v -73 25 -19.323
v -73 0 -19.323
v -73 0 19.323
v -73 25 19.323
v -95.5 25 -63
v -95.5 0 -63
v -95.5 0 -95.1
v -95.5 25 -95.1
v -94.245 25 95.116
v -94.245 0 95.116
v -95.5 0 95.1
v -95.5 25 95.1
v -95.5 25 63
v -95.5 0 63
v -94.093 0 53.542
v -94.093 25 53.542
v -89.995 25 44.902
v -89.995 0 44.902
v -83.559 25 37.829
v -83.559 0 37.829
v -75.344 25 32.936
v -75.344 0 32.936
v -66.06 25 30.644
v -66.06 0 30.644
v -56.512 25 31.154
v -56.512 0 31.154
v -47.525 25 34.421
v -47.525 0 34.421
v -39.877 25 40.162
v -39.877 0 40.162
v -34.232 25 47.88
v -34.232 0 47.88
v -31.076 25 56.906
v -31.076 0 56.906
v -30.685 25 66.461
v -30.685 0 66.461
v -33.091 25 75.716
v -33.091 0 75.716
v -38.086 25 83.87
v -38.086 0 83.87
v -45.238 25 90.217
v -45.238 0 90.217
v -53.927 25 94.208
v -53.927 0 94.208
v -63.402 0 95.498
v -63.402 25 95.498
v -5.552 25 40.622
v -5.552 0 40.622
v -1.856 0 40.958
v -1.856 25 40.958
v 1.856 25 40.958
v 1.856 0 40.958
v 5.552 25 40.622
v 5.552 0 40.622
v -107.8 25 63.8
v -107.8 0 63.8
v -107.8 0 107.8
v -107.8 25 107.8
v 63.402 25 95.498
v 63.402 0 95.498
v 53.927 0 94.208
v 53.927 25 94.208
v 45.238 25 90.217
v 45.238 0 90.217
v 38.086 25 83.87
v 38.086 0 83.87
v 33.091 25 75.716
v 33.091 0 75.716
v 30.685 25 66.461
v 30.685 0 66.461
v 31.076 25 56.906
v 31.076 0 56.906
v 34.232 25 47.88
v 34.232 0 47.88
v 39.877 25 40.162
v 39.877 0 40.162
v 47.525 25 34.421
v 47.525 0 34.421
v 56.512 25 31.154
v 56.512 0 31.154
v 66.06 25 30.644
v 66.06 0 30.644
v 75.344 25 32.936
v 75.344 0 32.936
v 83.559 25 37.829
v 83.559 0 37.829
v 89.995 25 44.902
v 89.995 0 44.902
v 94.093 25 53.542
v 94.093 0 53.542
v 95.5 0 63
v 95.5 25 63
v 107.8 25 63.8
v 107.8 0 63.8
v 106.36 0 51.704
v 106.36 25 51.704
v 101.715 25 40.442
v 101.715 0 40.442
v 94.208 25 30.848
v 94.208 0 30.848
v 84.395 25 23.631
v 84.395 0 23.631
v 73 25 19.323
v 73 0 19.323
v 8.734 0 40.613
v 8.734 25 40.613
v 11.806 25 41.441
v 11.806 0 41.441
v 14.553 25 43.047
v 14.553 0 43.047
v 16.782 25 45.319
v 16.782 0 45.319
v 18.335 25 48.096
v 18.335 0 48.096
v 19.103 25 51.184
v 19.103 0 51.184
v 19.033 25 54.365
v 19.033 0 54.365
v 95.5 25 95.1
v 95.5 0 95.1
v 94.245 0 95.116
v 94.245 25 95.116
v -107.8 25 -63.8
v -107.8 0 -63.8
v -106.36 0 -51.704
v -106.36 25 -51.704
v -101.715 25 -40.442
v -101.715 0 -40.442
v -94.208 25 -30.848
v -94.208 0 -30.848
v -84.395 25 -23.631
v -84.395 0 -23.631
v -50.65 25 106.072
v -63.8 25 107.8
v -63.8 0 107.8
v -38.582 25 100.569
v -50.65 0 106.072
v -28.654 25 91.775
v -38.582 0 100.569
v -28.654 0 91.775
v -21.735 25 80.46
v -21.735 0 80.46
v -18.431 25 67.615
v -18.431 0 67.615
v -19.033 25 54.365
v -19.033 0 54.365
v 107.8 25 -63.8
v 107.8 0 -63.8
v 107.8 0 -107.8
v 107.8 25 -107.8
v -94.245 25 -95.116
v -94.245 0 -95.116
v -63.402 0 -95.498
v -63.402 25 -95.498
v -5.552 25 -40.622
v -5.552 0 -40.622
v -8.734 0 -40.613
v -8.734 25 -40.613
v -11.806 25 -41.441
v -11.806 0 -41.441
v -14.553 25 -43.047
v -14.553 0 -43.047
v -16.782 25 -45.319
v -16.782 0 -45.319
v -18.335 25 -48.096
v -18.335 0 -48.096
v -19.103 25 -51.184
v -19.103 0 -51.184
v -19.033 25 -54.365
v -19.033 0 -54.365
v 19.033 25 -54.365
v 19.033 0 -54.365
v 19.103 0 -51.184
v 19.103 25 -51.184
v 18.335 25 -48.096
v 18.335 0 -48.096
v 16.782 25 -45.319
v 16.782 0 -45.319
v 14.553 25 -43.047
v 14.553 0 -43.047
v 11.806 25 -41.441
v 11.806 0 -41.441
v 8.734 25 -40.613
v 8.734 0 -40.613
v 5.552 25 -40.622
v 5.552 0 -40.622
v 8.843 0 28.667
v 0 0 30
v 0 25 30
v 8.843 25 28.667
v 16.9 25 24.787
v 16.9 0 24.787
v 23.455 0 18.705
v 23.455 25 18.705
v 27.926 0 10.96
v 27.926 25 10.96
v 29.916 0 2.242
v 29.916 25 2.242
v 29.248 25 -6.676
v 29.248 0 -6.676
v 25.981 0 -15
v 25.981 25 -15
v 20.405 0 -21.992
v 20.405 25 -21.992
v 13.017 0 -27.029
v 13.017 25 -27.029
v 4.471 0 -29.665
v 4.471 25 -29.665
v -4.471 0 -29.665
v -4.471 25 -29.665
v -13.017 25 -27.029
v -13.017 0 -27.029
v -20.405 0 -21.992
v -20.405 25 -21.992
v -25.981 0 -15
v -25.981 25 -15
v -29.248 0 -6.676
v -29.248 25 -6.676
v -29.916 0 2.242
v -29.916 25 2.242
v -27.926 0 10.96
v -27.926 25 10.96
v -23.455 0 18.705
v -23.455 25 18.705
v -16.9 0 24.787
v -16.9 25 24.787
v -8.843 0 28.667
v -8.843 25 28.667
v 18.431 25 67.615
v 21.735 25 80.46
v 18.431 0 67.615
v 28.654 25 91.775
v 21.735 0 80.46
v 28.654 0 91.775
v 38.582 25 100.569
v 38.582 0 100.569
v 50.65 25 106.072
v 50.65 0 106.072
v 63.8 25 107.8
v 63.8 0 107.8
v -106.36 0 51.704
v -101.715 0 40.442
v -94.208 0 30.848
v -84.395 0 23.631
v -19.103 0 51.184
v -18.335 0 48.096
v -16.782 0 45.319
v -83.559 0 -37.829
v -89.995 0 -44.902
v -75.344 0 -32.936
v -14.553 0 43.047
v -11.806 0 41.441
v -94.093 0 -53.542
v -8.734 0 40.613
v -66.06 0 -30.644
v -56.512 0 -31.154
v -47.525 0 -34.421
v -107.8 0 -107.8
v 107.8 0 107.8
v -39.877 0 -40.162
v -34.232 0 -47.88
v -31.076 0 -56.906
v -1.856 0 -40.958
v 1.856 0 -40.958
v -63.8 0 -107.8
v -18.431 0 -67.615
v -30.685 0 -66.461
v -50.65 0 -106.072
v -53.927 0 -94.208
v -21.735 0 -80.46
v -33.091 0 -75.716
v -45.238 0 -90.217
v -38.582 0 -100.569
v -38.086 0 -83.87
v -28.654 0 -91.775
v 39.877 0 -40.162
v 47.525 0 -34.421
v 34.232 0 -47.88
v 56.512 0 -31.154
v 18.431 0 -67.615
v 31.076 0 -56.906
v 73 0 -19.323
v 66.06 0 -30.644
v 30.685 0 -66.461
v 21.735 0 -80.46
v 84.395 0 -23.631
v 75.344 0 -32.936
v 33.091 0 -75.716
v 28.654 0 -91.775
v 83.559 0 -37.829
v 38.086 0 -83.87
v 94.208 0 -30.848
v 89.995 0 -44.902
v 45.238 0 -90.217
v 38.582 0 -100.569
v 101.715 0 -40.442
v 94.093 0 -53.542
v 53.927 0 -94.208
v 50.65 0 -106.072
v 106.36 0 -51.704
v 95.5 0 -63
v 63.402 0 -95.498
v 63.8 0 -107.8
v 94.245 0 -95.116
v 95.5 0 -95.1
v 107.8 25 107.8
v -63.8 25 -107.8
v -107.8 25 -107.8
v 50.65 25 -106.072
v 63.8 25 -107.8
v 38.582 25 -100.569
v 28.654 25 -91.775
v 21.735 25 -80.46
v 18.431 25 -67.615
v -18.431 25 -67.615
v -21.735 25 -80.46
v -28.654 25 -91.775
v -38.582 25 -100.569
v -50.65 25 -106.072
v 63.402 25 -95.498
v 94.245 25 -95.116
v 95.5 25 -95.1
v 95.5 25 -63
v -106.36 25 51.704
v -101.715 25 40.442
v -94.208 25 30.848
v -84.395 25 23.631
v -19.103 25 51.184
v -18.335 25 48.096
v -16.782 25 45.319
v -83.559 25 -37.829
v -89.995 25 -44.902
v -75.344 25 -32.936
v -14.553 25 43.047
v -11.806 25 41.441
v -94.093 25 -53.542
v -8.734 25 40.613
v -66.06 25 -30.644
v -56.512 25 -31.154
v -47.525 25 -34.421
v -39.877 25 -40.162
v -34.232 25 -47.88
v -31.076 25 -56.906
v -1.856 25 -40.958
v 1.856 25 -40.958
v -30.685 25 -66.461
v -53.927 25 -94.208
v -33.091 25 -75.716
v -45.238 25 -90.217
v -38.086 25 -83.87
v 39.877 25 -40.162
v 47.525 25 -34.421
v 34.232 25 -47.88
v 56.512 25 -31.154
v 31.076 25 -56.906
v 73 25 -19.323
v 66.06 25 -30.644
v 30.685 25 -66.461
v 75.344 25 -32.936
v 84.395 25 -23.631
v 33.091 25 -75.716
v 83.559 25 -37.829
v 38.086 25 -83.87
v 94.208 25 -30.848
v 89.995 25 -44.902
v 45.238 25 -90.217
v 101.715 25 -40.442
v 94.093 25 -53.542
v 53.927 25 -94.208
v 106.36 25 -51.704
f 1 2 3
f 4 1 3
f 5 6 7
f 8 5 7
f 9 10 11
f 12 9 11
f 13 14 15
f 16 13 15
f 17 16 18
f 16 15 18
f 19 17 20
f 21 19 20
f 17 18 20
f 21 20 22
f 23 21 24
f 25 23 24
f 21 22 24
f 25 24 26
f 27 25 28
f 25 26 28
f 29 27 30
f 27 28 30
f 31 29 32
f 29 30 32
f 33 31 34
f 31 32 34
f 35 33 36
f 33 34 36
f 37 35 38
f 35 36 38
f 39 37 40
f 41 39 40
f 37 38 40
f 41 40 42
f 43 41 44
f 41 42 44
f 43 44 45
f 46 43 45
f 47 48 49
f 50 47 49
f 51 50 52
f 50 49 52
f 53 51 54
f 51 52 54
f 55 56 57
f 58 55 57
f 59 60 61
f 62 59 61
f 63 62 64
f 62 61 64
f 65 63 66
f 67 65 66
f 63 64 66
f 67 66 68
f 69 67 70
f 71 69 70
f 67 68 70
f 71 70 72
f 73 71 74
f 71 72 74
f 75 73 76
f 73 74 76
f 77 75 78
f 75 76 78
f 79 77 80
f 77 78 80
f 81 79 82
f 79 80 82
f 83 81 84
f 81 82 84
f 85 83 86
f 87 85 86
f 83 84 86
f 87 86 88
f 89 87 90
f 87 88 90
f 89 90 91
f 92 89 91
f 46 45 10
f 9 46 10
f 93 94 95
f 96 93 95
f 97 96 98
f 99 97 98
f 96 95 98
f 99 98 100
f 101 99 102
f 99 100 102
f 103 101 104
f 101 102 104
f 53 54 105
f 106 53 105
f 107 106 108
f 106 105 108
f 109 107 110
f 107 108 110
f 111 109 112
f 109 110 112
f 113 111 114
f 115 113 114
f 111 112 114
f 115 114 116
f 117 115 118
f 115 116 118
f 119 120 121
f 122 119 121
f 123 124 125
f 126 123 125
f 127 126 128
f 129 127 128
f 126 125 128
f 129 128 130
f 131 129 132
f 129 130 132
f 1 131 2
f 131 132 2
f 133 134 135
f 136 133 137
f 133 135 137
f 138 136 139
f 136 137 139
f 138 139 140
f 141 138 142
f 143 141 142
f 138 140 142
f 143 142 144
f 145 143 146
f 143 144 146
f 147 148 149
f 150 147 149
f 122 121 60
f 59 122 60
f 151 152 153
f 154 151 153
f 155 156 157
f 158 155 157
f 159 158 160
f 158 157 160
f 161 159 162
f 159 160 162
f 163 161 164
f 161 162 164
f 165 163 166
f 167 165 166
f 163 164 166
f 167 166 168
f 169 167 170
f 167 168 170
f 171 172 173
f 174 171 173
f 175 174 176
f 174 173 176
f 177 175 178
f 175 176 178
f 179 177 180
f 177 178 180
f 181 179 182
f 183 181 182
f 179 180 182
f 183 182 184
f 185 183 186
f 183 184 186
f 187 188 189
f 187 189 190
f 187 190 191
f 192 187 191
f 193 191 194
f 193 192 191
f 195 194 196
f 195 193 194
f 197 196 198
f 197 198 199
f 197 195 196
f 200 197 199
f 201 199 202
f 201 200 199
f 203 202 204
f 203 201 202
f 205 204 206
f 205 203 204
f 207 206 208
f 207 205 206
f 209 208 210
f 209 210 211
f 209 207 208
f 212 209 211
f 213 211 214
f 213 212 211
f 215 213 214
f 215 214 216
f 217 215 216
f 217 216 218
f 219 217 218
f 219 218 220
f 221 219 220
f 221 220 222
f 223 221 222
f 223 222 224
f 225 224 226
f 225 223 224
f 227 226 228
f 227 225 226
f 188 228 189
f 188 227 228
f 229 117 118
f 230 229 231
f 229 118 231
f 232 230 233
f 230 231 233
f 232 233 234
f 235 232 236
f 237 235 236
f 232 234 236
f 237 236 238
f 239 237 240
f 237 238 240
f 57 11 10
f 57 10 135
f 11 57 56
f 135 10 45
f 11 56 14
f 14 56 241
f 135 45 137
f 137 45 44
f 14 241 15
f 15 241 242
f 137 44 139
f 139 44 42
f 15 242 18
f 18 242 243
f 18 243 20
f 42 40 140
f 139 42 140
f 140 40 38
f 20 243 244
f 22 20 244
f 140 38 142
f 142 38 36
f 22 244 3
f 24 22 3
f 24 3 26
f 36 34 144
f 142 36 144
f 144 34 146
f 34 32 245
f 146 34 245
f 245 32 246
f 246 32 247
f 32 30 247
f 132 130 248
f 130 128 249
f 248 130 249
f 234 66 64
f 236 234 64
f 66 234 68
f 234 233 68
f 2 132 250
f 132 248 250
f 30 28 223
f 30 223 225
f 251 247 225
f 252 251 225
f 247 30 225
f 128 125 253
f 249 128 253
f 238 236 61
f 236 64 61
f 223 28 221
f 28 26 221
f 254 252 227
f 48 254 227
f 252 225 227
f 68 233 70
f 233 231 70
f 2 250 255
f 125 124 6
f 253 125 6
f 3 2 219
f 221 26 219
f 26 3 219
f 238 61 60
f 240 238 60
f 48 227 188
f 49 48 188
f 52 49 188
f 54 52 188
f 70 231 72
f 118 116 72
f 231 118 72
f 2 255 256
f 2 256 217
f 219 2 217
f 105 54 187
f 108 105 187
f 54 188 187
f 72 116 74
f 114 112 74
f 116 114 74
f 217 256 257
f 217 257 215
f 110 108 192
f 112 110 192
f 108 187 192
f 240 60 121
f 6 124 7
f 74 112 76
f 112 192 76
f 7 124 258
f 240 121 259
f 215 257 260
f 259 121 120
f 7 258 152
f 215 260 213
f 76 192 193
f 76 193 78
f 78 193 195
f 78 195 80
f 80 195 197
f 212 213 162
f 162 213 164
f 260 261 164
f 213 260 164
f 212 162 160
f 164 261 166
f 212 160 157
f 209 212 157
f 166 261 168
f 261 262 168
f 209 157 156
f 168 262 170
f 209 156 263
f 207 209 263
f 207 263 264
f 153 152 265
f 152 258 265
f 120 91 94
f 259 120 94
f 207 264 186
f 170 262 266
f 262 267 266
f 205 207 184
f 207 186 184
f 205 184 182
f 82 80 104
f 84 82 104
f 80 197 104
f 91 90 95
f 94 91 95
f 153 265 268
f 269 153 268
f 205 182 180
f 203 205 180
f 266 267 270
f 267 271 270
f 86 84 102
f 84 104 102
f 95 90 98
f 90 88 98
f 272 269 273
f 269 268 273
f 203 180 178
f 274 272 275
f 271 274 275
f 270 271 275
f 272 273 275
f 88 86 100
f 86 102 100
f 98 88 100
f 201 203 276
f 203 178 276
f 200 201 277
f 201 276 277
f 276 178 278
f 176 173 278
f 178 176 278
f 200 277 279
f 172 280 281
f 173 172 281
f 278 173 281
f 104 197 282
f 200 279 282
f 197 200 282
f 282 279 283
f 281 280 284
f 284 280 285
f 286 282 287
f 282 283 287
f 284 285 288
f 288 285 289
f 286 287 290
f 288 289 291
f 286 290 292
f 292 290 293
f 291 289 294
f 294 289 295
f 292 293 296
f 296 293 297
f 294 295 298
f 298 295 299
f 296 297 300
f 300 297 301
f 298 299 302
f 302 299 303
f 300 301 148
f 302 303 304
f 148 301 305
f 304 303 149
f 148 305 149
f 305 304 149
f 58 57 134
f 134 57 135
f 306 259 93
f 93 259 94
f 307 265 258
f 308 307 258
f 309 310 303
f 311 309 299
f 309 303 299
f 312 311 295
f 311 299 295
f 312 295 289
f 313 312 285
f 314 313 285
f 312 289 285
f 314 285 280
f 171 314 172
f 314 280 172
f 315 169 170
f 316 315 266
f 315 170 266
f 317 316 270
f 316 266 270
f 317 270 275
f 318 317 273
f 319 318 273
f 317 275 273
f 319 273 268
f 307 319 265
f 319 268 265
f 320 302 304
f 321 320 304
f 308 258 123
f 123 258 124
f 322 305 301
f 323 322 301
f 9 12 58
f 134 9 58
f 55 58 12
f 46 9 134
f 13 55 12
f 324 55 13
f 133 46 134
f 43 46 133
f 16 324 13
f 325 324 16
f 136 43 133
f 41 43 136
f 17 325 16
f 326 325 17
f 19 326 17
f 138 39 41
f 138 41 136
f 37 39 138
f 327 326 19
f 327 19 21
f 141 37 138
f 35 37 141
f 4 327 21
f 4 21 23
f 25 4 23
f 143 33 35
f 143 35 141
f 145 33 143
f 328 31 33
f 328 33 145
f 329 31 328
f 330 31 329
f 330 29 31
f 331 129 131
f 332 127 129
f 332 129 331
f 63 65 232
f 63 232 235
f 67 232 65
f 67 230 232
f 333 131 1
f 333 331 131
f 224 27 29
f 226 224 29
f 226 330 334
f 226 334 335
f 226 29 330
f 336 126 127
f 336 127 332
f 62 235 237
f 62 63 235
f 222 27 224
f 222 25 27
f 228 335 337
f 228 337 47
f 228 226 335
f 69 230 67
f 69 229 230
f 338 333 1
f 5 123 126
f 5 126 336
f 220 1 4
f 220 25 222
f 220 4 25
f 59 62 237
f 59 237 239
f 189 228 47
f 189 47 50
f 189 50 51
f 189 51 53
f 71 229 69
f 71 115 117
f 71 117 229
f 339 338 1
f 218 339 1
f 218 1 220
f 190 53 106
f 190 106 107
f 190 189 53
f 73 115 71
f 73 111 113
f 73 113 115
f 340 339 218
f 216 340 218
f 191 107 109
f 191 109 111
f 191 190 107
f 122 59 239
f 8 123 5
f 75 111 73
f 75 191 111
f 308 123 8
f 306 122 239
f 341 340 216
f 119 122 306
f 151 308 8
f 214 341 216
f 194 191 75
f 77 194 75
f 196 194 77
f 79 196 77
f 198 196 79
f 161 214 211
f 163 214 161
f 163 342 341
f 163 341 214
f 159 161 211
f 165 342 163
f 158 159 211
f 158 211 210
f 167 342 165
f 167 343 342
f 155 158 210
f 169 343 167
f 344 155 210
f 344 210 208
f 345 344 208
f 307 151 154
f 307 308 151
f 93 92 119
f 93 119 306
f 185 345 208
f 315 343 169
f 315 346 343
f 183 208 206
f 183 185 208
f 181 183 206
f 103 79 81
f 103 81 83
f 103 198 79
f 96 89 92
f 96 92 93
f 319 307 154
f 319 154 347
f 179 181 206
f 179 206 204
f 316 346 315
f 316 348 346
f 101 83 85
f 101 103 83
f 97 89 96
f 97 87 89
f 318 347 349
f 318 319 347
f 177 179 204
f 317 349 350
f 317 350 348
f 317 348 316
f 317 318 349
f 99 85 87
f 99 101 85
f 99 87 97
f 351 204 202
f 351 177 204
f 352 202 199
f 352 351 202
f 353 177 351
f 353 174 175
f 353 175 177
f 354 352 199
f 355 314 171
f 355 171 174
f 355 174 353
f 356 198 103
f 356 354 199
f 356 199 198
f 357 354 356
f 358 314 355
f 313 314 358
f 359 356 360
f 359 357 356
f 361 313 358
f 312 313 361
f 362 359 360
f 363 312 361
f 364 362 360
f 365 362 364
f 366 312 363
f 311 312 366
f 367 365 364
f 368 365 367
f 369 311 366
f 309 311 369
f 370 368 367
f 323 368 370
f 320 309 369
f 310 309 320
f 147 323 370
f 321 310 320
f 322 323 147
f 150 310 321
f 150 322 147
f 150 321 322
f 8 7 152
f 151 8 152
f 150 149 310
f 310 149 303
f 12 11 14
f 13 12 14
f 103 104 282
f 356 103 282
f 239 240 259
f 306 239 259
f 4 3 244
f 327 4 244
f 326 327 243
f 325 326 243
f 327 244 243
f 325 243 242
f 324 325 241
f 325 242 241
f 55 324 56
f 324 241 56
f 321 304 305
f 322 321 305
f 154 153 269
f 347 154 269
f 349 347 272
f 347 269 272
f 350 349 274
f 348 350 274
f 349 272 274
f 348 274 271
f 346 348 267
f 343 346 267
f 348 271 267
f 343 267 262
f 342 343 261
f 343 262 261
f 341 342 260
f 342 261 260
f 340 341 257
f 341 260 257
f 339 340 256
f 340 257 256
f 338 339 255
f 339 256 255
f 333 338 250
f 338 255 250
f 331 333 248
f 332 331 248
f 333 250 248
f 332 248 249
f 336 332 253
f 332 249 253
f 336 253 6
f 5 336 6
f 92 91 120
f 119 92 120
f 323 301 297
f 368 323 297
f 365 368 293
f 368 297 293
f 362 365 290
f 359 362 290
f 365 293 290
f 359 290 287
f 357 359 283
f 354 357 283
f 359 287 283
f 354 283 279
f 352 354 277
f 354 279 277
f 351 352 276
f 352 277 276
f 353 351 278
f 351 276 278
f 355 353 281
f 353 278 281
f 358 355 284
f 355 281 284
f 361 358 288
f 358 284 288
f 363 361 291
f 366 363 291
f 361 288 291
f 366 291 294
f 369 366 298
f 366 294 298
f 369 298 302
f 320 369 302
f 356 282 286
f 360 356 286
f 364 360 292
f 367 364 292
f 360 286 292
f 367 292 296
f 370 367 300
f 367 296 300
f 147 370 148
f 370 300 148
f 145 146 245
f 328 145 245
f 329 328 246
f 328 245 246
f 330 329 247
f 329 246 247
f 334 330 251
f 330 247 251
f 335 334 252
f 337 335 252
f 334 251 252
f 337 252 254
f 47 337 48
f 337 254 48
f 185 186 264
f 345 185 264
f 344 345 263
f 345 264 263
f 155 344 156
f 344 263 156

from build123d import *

# Parameters (mm, degrees)
SKETCH1_R           = 30
BOSS_EXTRUDE1_DEPTH = 25


with BuildPart() as part:
    # Sketch1 → Boss-Extrude1 (new body)
    with BuildSketch(Plane(origin=(0, 0, 0), x_dir=(1, 0, 0), z_dir=(0, 1, 0))):
        with BuildLine():
            Line((-63.8, 107.8), (-107.8, 107.8))
            Line((-107.8, 107.8), (-107.8, 63.8))
            ThreePointArc((-107.8, 63.8), (-98.288961426, 35.388965946), (-73, 19.323003766))
            Line((-73, 19.323003766), (-73, -19.323003766))
            ThreePointArc((-73, -19.323003766), (-98.288961426, -35.388965946), (-107.8, -63.8))
            Line((-107.8, -63.8), (-107.8, -107.8))
            Line((-107.8, -107.8), (-63.8, -107.8))
            ThreePointArc((-63.8, -107.8), (-28.653661458, -91.775146025), (-19.03272249, -54.365273115))
            ThreePointArc((-19.03272249, -54.365273115), (-15.743256927, -44.108614607), (-5.551800988, -40.62237691))
            ThreePointArc((-5.551800988, -40.62237691), (0, -41), (5.551800988, -40.62237691))
            ThreePointArc((5.551800988, -40.62237691), (15.743256927, -44.108614607), (19.03272249, -54.365273115))
            ThreePointArc((19.03272249, -54.365273115), (28.653661458, -91.775146025), (63.8, -107.8))
            Line((63.8, -107.8), (107.8, -107.8))
            Line((107.8, -107.8), (107.8, -63.8))
            ThreePointArc((107.8, -63.8), (98.288961426, -35.388965946), (73, -19.323003766))
            Line((73, -19.323003766), (73, 19.323003766))
            ThreePointArc((73, 19.323003766), (98.288961426, 35.388965946), (107.8, 63.8))
            Line((107.8, 63.8), (107.8, 107.8))
            Line((107.8, 107.8), (63.8, 107.8))
            ThreePointArc((63.8, 107.8), (28.653661458, 91.775146025), (19.03272249, 54.365273115))
            ThreePointArc((19.03272249, 54.365273115), (15.743256927, 44.108614607), (5.551800988, 40.62237691))
            ThreePointArc((5.551800988, 40.62237691), (0, 41), (-5.551800988, 40.62237691))
            ThreePointArc((-5.551800988, 40.62237691), (-15.743256927, 44.108614607), (-19.03272249, 54.365273115))
            ThreePointArc((-19.03272249, 54.365273115), (-28.653661458, 91.775146025), (-63.8, 107.8))
        make_face()
        with BuildLine():
            Line((-94.245355165, -95.115537993), (-95.5, -95.1))
            Line((-95.5, -95.1), (-95.5, -93.845258955))
            Line((-95.5, -93.845258955), (-95.5, -63))
            ThreePointArc((-95.5, -63), (-39.877175844, -40.161764449), (-63.40246135, -95.497507979))
            Line((-63.40246135, -95.497507979), (-94.245355165, -95.115537993))
        make_face(mode=Mode.SUBTRACT)
        with BuildLine():
            Line((95.5, -93.845258955), (95.5, -95.1))
            Line((95.5, -95.1), (94.245355165, -95.115537993))
            Line((94.245355165, -95.115537993), (63.40246135, -95.497507979))
            ThreePointArc((63.40246135, -95.497507979), (39.877175844, -40.161764449), (95.5, -63))
            Line((95.5, -63), (95.5, -93.845258955))
        make_face(mode=Mode.SUBTRACT)
        with Locations(Location((0, 0, 0), (0, 0, 270))):
            Circle(SKETCH1_R, mode=Mode.SUBTRACT)
        with BuildLine():
            Line((-95.5, 93.845258955), (-95.5, 95.1))
            Line((-95.5, 95.1), (-94.245355165, 95.115537993))
            Line((-94.245355165, 95.115537993), (-63.40246135, 95.497507979))
            ThreePointArc((-63.40246135, 95.497507979), (-39.877175844, 40.161764449), (-95.5, 63))
            Line((-95.5, 63), (-95.5, 93.845258955))
        make_face(mode=Mode.SUBTRACT)
        with BuildLine():
            Line((94.245355165, 95.115537993), (95.5, 95.1))
            Line((95.5, 95.1), (95.5, 93.845258955))
            Line((95.5, 93.845258955), (95.5, 63))
            ThreePointArc((95.5, 63), (39.877175844, 40.161764449), (63.40246135, 95.497507979))
            Line((63.40246135, 95.497507979), (94.245355165, 95.115537993))
        make_face(mode=Mode.SUBTRACT)
    extrude(amount=BOSS_EXTRUDE1_DEPTH)


solid = part.part
